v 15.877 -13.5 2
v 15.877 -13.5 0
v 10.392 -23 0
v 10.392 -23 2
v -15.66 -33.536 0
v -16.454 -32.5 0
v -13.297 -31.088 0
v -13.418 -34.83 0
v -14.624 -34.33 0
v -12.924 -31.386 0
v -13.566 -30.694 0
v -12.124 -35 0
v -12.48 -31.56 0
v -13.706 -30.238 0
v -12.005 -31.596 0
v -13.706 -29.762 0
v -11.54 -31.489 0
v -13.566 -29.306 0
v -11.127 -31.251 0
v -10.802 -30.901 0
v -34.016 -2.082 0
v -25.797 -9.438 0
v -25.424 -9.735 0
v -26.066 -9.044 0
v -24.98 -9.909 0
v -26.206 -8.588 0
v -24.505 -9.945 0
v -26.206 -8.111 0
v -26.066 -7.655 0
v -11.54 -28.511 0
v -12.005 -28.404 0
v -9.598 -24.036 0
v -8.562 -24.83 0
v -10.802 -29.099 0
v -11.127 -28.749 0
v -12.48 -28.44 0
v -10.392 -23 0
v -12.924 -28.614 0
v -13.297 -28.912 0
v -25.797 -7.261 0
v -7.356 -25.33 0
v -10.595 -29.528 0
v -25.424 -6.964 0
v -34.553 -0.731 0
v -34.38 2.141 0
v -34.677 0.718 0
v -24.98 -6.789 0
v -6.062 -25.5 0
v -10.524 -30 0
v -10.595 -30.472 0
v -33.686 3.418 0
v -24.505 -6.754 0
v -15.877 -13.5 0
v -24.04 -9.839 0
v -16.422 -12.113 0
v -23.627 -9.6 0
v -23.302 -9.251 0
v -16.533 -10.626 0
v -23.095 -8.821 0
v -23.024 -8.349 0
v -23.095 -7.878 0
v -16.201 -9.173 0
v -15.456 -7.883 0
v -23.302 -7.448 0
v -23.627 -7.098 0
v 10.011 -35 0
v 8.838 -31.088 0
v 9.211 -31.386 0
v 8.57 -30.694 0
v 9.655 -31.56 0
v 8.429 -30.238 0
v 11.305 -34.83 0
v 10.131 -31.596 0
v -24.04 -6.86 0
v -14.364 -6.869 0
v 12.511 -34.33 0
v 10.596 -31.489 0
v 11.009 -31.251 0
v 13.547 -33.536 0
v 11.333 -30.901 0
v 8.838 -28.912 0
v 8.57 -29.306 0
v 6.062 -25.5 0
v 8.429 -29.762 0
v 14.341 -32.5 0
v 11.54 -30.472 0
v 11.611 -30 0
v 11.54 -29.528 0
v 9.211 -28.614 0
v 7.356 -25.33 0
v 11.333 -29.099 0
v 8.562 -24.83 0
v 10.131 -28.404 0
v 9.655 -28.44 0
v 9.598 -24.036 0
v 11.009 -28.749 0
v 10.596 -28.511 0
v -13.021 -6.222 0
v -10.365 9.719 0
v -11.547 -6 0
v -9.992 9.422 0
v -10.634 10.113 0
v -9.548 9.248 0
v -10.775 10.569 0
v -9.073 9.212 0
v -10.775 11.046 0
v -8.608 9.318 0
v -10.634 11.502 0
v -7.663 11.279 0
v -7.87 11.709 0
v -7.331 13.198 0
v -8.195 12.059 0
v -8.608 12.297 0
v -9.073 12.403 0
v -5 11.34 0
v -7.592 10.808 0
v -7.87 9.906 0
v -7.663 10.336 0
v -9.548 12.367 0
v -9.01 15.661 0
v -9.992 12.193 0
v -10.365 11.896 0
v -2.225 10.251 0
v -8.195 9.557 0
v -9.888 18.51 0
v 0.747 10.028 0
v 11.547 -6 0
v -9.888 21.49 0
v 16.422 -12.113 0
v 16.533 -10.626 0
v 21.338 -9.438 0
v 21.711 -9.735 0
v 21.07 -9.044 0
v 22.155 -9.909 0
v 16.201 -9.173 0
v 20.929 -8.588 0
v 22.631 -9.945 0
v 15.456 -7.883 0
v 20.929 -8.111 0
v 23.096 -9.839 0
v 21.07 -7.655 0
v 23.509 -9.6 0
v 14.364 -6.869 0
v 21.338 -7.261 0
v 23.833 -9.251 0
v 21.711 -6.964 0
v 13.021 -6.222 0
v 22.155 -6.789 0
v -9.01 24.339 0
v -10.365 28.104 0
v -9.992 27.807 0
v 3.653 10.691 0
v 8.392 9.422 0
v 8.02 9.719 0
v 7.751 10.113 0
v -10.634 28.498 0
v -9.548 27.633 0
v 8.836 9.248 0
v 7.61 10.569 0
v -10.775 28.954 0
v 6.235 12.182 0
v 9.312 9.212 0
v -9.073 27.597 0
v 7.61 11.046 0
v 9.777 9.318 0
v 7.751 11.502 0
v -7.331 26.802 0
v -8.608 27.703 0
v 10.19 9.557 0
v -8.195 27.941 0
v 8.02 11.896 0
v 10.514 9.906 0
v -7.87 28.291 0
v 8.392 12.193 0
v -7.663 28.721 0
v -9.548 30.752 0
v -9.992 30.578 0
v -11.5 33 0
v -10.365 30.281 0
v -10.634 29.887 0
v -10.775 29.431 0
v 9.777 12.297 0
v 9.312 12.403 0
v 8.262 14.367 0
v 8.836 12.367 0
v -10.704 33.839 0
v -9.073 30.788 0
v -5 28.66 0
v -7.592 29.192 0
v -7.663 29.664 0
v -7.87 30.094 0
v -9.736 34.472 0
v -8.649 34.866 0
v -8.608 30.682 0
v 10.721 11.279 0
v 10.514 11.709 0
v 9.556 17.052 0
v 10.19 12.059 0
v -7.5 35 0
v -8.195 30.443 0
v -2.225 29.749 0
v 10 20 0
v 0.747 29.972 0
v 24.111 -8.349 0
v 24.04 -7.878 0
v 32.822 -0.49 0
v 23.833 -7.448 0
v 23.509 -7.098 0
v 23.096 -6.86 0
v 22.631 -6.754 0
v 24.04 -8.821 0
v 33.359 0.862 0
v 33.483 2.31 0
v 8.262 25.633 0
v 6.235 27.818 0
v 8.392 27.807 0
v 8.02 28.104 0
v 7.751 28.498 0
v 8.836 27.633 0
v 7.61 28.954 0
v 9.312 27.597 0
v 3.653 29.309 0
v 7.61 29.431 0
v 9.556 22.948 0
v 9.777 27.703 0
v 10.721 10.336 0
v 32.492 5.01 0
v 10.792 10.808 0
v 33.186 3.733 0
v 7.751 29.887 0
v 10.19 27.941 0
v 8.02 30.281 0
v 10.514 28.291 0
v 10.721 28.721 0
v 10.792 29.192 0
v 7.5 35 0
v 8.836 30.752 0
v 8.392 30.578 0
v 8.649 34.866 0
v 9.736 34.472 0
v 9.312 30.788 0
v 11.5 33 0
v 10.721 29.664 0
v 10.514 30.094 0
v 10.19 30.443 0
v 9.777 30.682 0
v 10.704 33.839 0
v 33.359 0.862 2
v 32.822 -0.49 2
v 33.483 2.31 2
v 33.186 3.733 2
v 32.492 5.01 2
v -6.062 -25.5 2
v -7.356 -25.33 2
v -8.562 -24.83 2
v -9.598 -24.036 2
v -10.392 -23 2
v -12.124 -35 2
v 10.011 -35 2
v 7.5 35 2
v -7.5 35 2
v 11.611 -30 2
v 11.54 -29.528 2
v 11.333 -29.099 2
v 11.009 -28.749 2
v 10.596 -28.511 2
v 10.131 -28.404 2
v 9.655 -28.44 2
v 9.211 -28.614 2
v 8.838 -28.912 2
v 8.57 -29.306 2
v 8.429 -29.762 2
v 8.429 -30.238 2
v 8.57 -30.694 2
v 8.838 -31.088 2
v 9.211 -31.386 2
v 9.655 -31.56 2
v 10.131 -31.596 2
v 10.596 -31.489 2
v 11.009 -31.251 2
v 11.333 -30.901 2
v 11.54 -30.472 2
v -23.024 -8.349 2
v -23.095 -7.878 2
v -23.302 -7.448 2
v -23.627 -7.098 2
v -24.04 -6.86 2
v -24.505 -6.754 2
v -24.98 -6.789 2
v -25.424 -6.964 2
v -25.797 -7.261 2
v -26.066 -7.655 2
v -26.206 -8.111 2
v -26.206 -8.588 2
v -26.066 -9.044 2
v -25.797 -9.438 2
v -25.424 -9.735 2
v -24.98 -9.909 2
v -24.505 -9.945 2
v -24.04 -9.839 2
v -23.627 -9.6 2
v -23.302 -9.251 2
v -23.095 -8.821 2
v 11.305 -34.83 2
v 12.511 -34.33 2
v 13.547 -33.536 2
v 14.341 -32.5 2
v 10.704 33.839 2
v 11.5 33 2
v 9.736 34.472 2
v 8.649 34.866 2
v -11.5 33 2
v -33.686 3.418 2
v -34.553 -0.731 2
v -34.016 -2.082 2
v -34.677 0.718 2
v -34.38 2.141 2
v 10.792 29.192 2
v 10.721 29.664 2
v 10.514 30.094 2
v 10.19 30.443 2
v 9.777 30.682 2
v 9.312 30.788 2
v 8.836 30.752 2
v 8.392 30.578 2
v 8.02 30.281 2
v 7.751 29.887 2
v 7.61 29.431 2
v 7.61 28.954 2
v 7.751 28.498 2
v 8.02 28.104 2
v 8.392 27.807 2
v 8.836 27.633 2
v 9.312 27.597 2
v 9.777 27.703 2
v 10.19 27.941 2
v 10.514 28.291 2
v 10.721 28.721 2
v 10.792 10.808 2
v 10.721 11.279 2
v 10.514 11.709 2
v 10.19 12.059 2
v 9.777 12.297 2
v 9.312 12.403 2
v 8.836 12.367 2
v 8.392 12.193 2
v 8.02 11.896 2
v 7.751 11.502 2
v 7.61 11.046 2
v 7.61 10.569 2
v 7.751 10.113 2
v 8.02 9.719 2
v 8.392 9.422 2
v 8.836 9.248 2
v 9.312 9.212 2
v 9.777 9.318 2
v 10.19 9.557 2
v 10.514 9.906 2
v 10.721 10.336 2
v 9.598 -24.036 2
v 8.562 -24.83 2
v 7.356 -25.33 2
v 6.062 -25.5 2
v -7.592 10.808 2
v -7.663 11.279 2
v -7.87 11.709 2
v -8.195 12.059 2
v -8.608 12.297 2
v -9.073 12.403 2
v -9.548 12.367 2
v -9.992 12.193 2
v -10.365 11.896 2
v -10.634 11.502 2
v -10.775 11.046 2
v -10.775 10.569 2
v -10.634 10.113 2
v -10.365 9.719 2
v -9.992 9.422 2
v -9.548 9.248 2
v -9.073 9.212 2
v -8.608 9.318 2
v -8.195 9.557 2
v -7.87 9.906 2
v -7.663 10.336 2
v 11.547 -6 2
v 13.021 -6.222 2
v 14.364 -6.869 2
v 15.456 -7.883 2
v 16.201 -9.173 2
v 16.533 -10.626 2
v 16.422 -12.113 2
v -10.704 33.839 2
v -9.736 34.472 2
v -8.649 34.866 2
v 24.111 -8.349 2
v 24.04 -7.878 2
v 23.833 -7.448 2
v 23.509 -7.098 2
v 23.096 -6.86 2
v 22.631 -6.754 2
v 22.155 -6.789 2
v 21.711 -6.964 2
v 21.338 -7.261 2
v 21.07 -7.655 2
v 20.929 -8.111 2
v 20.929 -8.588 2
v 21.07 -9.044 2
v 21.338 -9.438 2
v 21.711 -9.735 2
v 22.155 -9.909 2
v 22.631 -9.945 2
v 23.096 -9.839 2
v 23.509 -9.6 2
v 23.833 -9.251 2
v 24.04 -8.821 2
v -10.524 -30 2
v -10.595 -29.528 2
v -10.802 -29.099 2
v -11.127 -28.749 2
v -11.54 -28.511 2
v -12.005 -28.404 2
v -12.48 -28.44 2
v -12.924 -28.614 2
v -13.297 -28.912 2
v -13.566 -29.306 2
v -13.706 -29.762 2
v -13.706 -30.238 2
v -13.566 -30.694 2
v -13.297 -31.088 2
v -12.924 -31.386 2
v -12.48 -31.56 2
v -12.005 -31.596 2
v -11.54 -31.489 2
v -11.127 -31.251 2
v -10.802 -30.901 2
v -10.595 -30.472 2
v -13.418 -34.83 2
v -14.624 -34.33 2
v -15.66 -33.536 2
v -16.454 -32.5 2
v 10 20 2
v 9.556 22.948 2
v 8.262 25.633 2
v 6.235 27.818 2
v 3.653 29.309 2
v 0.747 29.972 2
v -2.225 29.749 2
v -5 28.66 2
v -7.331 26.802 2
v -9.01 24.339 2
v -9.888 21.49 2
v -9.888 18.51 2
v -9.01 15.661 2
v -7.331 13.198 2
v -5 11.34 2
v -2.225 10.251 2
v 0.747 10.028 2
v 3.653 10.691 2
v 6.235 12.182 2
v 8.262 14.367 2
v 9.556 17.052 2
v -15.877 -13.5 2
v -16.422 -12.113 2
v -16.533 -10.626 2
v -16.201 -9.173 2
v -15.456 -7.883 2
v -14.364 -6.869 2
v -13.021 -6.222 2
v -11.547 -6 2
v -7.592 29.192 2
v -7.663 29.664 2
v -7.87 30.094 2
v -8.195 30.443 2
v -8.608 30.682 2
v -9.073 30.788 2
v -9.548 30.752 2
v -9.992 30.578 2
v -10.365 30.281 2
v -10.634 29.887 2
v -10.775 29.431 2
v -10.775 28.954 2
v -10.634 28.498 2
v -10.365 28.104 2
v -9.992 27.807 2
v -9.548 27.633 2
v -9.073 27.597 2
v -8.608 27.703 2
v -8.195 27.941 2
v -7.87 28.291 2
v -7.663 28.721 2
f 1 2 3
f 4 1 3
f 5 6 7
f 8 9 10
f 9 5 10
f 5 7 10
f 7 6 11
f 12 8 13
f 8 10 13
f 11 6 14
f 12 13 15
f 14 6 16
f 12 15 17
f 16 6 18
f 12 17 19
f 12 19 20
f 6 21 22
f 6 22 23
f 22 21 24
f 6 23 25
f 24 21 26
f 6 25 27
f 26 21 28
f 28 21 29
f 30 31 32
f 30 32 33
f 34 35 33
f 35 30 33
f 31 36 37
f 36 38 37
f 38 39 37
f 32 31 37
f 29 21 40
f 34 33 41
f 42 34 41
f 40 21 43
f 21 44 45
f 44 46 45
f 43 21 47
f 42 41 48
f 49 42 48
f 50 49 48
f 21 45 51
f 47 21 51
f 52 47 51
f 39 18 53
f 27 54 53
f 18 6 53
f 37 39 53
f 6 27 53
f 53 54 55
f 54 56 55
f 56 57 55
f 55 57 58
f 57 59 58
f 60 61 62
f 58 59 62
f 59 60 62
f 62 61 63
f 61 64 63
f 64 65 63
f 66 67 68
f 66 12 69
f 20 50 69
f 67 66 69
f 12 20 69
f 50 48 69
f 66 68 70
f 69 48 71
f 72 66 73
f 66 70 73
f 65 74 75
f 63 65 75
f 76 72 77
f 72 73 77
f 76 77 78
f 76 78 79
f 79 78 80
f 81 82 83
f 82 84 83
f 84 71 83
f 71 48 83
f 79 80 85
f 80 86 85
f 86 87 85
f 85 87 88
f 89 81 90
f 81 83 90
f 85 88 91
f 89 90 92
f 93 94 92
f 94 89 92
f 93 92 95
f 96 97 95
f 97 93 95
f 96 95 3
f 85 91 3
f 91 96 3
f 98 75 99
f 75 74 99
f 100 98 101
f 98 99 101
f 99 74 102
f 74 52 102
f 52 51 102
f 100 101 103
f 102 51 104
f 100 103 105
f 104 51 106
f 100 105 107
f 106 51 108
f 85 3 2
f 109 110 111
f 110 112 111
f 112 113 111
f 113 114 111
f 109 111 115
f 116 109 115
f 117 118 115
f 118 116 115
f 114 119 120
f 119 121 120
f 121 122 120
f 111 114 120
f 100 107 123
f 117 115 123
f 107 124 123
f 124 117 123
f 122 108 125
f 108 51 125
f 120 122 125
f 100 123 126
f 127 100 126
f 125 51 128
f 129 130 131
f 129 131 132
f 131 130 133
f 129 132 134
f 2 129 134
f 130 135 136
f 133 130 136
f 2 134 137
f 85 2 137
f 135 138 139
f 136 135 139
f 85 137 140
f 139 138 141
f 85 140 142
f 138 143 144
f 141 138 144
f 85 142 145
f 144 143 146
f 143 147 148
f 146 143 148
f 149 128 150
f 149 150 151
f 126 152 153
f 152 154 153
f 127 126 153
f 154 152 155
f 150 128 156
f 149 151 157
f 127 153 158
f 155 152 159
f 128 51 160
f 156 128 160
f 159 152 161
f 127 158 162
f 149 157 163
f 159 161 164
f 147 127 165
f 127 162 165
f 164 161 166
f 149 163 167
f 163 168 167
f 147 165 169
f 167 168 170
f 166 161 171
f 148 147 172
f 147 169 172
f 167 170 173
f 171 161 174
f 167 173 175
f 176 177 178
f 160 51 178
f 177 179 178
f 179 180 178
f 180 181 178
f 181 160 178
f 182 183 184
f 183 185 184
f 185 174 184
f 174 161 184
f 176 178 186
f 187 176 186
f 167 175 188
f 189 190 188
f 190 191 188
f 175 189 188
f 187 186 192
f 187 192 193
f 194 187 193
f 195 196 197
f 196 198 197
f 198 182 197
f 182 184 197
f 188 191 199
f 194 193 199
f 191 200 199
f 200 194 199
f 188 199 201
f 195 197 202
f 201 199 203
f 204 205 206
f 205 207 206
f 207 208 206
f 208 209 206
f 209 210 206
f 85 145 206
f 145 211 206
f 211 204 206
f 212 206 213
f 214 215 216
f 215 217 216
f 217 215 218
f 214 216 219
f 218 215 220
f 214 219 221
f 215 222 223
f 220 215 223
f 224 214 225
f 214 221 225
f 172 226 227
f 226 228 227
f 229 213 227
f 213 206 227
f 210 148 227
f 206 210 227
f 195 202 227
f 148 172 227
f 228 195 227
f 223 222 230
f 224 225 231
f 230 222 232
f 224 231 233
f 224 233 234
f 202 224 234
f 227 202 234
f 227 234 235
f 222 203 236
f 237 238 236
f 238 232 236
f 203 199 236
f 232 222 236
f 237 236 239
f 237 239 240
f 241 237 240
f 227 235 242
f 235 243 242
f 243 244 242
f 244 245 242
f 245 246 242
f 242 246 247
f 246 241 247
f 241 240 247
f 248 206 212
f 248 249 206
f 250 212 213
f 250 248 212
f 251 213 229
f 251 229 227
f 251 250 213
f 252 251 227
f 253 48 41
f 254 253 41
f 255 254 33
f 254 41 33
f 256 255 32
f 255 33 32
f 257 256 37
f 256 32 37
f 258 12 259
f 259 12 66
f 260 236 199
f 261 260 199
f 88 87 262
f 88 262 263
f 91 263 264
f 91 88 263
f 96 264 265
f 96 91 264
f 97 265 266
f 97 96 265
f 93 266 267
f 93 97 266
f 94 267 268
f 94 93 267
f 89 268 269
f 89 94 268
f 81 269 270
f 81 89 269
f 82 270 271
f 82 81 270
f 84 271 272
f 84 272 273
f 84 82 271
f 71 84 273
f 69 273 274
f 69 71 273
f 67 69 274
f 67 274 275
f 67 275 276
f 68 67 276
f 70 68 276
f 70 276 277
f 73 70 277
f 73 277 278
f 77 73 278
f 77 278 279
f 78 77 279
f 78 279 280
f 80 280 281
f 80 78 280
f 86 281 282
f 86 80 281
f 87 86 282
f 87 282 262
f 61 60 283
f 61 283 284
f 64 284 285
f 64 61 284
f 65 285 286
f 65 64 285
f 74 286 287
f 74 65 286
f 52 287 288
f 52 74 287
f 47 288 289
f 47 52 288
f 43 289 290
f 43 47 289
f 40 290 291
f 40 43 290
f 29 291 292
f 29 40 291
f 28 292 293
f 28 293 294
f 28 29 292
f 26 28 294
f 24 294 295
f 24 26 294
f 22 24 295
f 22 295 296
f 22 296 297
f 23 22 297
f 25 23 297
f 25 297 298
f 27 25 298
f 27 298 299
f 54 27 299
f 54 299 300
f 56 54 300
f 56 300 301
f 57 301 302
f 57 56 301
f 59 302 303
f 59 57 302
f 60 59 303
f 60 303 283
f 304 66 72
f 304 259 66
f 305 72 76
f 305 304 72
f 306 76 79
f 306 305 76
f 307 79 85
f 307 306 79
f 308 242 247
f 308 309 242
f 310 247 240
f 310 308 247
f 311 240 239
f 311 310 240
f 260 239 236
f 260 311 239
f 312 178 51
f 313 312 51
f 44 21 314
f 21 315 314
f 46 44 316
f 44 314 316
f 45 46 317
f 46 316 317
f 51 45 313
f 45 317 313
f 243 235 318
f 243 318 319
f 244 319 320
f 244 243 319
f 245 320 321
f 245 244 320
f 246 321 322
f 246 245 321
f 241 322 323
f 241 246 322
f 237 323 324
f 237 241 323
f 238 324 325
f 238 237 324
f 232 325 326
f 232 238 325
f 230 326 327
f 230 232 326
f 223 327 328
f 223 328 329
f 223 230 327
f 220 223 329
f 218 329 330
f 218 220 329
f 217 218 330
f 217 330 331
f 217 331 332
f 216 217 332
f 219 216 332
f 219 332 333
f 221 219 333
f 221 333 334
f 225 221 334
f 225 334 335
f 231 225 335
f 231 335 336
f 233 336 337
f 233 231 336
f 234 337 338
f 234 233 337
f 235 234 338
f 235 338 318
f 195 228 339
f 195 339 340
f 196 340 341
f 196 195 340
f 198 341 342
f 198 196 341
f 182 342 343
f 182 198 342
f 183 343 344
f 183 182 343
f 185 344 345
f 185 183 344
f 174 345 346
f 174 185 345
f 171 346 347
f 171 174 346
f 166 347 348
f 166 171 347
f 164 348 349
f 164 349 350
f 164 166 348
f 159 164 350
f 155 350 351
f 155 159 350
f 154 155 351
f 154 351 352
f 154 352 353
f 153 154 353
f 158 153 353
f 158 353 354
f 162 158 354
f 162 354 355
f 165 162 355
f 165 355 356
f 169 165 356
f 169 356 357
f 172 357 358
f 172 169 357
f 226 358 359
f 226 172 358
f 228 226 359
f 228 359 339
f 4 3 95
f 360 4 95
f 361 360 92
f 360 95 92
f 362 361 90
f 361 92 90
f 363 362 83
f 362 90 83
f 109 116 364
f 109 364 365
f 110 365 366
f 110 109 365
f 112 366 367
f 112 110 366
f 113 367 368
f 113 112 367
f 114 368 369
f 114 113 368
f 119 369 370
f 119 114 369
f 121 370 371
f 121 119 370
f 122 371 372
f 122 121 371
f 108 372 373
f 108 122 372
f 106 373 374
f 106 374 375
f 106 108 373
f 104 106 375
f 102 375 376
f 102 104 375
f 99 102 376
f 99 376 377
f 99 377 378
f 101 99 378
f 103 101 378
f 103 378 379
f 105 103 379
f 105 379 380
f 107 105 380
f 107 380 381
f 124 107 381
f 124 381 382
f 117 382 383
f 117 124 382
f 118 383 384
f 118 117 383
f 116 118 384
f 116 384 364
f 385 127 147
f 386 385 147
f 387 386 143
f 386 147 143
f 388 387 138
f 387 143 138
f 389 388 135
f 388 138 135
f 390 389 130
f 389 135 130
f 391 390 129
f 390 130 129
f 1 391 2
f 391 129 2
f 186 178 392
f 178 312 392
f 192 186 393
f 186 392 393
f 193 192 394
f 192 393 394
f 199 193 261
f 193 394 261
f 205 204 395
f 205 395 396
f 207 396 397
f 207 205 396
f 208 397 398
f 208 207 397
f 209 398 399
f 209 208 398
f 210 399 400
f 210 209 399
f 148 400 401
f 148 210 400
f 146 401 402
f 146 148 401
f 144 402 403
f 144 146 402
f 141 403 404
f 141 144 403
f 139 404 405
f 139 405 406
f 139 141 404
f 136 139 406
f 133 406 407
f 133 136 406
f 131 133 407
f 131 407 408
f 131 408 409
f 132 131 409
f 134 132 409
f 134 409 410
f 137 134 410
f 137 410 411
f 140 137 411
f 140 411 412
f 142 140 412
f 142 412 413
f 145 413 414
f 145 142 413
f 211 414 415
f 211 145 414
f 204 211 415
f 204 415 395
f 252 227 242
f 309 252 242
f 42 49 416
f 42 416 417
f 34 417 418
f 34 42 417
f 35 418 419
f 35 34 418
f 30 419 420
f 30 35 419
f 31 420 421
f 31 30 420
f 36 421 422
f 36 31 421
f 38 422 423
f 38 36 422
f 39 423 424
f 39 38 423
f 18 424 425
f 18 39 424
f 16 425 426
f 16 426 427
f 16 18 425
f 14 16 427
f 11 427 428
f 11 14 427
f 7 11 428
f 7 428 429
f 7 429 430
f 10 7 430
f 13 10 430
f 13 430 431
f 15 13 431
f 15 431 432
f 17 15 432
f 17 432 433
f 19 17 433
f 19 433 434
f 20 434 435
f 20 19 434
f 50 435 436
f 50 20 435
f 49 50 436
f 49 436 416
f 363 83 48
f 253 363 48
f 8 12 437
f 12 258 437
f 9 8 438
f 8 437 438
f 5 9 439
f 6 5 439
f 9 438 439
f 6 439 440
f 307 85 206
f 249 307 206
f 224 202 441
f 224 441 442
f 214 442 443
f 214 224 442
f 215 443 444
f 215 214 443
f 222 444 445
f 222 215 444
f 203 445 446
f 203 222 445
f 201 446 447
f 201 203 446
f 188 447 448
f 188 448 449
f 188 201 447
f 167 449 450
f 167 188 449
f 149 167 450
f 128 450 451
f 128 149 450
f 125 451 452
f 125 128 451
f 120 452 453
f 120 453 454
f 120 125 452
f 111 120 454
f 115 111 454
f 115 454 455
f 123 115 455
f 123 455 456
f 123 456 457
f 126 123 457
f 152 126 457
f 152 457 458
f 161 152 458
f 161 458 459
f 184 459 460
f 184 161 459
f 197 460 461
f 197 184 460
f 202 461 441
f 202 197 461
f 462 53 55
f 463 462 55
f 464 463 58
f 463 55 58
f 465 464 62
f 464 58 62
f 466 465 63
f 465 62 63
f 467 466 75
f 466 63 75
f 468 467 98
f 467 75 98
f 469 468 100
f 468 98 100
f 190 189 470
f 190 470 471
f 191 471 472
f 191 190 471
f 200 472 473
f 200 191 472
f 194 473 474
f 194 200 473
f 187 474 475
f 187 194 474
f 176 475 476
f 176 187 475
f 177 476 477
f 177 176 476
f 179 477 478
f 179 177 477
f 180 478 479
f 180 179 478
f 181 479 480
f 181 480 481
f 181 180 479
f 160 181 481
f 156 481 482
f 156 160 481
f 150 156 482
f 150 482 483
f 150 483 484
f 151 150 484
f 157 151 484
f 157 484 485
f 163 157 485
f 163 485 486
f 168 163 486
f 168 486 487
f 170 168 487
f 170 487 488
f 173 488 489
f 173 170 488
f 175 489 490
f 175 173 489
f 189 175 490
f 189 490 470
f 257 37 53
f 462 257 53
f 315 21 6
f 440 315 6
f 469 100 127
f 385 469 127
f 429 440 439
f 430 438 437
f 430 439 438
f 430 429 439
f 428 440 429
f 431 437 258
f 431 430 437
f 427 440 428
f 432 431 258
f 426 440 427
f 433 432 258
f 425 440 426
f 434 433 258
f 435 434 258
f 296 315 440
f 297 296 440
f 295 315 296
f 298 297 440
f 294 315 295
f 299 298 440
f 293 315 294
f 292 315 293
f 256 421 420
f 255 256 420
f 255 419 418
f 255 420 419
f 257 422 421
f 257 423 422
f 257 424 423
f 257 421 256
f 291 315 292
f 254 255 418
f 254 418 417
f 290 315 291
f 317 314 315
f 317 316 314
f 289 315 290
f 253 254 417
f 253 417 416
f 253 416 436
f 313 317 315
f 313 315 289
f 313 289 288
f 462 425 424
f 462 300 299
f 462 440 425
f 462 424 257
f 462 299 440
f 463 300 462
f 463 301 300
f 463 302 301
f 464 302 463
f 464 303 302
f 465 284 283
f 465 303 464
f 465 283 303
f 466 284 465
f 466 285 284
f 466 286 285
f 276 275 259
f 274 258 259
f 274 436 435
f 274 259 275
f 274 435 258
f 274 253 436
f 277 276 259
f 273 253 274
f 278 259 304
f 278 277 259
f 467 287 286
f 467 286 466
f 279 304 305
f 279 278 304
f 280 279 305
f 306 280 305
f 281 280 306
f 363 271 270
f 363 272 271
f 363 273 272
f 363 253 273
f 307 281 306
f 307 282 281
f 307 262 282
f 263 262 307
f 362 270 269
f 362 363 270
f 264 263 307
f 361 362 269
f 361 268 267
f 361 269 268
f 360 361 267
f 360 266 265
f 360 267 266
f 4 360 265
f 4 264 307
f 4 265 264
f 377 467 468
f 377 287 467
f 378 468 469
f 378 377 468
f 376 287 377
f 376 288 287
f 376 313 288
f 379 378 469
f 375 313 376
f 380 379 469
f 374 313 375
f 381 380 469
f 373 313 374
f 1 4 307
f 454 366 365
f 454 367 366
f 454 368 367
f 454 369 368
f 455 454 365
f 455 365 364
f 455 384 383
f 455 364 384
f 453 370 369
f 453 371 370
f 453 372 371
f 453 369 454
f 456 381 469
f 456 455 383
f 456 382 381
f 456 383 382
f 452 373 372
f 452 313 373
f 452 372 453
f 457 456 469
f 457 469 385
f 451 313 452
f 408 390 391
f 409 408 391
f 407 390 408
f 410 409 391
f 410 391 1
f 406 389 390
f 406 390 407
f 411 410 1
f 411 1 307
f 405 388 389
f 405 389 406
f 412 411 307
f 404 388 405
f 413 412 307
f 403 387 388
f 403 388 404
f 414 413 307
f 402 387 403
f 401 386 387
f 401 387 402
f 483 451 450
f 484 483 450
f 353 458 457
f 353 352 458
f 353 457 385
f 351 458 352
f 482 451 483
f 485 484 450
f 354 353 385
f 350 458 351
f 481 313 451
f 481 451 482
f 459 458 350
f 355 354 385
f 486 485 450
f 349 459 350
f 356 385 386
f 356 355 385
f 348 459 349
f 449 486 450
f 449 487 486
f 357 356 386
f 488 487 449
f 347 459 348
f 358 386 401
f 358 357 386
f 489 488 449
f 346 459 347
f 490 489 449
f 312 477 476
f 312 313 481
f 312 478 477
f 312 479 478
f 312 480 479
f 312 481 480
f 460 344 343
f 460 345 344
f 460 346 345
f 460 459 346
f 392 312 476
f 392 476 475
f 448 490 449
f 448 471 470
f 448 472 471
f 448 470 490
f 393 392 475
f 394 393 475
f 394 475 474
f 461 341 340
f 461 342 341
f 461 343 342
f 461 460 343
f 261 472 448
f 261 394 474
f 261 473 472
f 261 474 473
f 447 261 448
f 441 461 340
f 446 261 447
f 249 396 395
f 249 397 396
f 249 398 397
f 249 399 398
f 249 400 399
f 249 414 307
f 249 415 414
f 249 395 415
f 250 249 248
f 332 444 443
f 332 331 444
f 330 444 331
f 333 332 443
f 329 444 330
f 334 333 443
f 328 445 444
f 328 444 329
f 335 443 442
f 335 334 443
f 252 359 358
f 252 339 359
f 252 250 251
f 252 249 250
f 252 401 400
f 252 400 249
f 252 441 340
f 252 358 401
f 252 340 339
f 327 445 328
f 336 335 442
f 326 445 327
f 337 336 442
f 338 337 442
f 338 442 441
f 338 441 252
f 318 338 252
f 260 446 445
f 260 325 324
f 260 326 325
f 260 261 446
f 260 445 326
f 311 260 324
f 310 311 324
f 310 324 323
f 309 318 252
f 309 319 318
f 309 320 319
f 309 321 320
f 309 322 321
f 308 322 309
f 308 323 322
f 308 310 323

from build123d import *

# Parameters (mm, degrees)
EXTRUDE_1_OUTLINE_R   = 1.6
EXTRUDE_1_OUTLINE_R_2 = 10
EXTRUDE_1_DEPTH       = 2
FILLET_1_R            = 5


# Read off the part's stored shape, not the designer's step: ﾎﾞｽ - 押し出し1
with BuildPart() as part:
    # ﾎﾞｽ - 押し出し1 outline → ﾎﾞｽ - 押し出し1 (new body)
    with BuildSketch(Plane.XY):
        Polygon((-15.011106999, -35), (12.897858345, -35), (34.473029949, 2.369293401), (10, 35), (-10, 35), (-35.667090423, 0.77721277), align=None)
        with Locations((-12.124355653, -30)):
            Circle(EXTRUDE_1_OUTLINE_R, mode=Mode.SUBTRACT)
        with Locations((-24.624355653, -8.349364905)):
            Circle(EXTRUDE_1_OUTLINE_R, mode=Mode.SUBTRACT)
        with Locations((10.011106999, -30)):
            Circle(EXTRUDE_1_OUTLINE_R, mode=Mode.SUBTRACT)
        with BuildLine():
            Line((6.062177826, -25.5), (-6.062177826, -25.5))
            ThreePointArc((-6.062177826, -25.5), (-8.562177826, -24.830127019), (-10.392304845, -23))
            Line((-10.392304845, -23), (-15.877132403, -13.5))
            ThreePointArc((-15.877132403, -13.5), (-15.877132403, -8.5), (-11.547005384, -6))
            Line((-11.547005384, -6), (11.547005384, -6))
            ThreePointArc((11.547005384, -6), (15.877132403, -8.5), (15.877132403, -13.5))
            Line((15.877132403, -13.5), (10.392304845, -23))
            ThreePointArc((10.392304845, -23), (8.562177826, -24.830127019), (6.062177826, -25.5))
        make_face(mode=Mode.SUBTRACT)
        with Locations((22.511106999, -8.349364905)):
            Circle(EXTRUDE_1_OUTLINE_R, mode=Mode.SUBTRACT)
        with Locations((-9.192388155, 10.807611845)):
            Circle(EXTRUDE_1_OUTLINE_R, mode=Mode.SUBTRACT)
        with Locations((-9.192388155, 29.192388155)):
            Circle(EXTRUDE_1_OUTLINE_R, mode=Mode.SUBTRACT)
        with Locations((9.192388155, 10.807611845)):
            Circle(EXTRUDE_1_OUTLINE_R, mode=Mode.SUBTRACT)
        with Locations((0, 20)):
            Circle(EXTRUDE_1_OUTLINE_R_2, mode=Mode.SUBTRACT)
        with Locations((9.192388155, 29.192388155)):
            Circle(EXTRUDE_1_OUTLINE_R, mode=Mode.SUBTRACT)
    extrude(amount=EXTRUDE_1_DEPTH)

    # ﾌｨﾚｯﾄ1
    fillet_1_edges = [part.edges().sort_by_distance(p)[0] for p in [
        (12.897858345, -35, 1),
        (-15.011106999, -35, 1),
        (-35.667090423, 0.77721277, 1),
        (-10, 35, 1),
        (10, 35, 1),
        (34.473029949, 2.369293401, 1),
    ]]
    fillet(fillet_1_edges, radius=FILLET_1_R)


solid = part.part
